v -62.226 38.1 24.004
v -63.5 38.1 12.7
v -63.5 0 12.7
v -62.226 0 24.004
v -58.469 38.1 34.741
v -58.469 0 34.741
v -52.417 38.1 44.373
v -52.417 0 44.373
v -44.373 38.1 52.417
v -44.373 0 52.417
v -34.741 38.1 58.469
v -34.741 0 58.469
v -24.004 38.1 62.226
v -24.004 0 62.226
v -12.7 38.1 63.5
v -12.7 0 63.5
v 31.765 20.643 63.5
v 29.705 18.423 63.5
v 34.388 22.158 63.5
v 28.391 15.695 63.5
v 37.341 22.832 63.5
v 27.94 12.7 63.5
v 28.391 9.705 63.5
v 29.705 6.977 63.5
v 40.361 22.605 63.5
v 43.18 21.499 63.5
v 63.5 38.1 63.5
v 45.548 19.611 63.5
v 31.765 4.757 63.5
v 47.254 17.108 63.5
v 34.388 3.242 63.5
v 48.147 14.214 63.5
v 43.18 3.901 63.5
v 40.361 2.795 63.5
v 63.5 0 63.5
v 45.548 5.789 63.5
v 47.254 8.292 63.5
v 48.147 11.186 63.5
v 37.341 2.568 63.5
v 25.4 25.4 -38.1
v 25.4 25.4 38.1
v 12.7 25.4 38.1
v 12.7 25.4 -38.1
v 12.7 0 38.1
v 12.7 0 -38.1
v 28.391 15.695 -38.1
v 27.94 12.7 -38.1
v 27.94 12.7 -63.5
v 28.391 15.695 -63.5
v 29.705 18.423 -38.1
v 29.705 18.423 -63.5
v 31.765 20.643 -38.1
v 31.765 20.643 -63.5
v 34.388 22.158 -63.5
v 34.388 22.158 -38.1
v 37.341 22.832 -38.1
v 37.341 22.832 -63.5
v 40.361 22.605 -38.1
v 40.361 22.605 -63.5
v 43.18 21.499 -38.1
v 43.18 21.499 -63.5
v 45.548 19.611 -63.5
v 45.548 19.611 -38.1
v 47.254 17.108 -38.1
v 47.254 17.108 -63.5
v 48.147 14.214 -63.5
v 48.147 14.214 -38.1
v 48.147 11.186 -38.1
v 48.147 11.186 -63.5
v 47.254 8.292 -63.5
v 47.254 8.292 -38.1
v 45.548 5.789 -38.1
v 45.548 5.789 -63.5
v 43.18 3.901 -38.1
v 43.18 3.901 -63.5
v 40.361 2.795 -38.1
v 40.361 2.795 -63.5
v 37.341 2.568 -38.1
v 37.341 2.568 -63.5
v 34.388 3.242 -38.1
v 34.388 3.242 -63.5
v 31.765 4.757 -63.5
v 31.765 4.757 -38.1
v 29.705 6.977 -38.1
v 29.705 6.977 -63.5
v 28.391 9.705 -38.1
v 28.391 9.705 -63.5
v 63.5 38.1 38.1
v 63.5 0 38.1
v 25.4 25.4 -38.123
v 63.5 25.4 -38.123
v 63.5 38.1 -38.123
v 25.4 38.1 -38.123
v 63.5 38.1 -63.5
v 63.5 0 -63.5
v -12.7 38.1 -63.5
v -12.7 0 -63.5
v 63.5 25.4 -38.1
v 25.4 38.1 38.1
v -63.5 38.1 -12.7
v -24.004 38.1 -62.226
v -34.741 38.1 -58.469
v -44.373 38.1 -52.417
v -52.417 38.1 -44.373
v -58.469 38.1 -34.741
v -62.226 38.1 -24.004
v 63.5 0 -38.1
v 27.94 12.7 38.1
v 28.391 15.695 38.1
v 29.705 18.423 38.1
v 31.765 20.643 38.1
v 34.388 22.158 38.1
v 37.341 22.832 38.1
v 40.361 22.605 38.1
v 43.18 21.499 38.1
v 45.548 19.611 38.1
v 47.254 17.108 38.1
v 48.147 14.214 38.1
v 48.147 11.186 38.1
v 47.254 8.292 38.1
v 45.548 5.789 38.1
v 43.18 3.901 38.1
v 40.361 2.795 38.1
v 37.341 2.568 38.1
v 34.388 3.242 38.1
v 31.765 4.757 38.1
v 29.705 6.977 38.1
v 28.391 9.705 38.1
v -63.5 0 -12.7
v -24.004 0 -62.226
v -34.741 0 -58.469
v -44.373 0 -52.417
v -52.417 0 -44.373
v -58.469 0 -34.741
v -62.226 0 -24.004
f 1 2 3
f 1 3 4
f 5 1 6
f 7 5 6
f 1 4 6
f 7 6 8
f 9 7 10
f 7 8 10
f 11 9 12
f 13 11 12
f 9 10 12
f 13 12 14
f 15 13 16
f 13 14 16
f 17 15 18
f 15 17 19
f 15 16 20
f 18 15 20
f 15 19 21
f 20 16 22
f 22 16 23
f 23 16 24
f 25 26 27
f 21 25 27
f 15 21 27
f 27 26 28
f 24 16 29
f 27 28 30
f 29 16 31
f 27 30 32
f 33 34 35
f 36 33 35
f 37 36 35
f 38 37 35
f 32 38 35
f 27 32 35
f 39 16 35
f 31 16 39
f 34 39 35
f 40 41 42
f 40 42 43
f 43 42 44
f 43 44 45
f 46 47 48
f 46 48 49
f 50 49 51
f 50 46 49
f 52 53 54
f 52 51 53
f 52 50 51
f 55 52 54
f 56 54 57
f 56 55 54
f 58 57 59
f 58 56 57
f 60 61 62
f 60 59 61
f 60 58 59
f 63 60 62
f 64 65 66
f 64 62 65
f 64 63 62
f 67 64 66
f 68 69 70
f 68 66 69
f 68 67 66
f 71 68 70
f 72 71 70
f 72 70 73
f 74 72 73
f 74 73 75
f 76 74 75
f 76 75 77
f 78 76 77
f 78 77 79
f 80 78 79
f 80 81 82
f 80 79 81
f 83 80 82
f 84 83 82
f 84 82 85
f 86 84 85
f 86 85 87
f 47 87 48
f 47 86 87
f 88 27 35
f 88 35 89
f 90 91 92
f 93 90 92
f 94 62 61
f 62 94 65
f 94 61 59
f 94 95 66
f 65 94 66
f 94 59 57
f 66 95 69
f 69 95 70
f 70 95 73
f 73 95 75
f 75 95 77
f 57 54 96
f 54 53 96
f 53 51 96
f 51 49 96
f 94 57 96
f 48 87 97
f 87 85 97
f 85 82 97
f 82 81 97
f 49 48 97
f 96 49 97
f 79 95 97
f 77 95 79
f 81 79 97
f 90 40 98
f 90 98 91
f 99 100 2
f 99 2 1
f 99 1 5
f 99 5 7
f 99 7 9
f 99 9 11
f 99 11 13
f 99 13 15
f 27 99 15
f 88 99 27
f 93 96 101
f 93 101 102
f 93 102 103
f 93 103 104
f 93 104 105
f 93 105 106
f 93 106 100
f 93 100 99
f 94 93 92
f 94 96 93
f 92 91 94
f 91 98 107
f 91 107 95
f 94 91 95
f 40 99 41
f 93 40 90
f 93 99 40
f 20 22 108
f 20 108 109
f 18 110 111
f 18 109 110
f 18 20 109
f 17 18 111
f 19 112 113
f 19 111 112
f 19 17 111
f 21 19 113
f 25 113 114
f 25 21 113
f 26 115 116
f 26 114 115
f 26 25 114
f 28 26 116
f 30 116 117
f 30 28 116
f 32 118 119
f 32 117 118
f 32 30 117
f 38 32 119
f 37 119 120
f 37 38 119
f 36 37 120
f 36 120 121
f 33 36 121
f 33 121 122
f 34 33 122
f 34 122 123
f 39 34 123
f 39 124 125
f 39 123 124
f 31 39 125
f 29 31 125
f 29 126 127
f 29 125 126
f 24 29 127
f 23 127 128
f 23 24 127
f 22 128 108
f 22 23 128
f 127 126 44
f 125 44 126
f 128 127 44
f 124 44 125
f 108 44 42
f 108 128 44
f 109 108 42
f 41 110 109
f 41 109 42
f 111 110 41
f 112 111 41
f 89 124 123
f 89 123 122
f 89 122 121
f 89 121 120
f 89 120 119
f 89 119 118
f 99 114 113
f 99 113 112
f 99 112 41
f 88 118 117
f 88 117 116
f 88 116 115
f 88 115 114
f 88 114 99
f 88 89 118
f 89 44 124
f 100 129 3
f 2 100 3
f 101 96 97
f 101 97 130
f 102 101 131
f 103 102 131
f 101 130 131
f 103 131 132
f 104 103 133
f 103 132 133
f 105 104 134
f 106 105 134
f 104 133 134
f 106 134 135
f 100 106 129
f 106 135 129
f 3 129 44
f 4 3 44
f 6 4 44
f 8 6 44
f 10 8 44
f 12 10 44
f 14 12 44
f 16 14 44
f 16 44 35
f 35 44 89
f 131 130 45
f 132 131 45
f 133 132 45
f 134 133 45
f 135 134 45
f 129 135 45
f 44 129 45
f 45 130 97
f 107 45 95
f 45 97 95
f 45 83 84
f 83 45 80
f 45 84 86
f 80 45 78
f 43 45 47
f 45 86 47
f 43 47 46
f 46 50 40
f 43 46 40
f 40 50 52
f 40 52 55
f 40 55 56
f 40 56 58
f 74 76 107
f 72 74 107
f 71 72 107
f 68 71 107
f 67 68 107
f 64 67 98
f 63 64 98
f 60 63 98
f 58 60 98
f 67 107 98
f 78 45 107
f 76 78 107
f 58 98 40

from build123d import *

# Parameters (mm, degrees)
BOSS_EXTRUDE1_DEPTH     = 38.1
SKETCH2_W               = 76.2
SKETCH2_H               = 50.8
CUT_EXTRUDE1_DEPTH      = 50.8
CUT_EXTRUDE2_DEPTH      = 126.723585695
CUT_EXTRUDE2_DEPTH_BACK = 126.723585695
SKETCH3_R               = 10.16
SKETCH6_W               = 76.223232364
SKETCH6_H               = 12.7
CUT_EXTRUDE4_DEPTH      = 38.1


with BuildPart() as part:
    # Sketch1 → Boss-Extrude1 (new body)
    with BuildSketch(Plane(origin=(0, 0, 0), x_dir=(1, 0, 0), z_dir=(0, 1, 0))):
        with BuildLine():
            Line((63.5, 63.5), (-12.7, 63.5))
            ThreePointArc((-12.7, 63.5), (-48.621024484, 48.621024484), (-63.5, 12.7))
            Line((-63.5, 12.7), (-63.5, -12.7))
            ThreePointArc((-63.5, -12.7), (-48.621024484, -48.621024484), (-12.7, -63.5))
            Line((-12.7, -63.5), (63.5, -63.5))
            Line((63.5, -63.5), (63.5, 63.5))
        make_face()
    extrude(amount=BOSS_EXTRUDE1_DEPTH)

    # Sketch2 → Cut-Extrude1 (cut)
    with BuildSketch(Plane(origin=(63.5, 0, 0), x_dir=(0, 0, -1), z_dir=(1, 0, 0))):
        Rectangle(SKETCH2_W, SKETCH2_H)
    extrude(amount=-CUT_EXTRUDE1_DEPTH, mode=Mode.SUBTRACT)

    # Sketch3 → Cut-Extrude2 (cut, two sides: drawn at the far end of the back side and taken through both)
    with BuildSketch(Plane(origin=(0, 0, 38.1), x_dir=(-1, 0, 0), z_dir=(0, 0, -1)).offset(-CUT_EXTRUDE2_DEPTH_BACK)):
        with Locations((-38.1, 12.7)):
            Circle(SKETCH3_R)
    extrude(amount=CUT_EXTRUDE2_DEPTH + CUT_EXTRUDE2_DEPTH_BACK, mode=Mode.SUBTRACT)

    # Sketch6 → Cut-Extrude4 (cut)
    with BuildSketch(Plane(origin=(63.5, 0, 0), x_dir=(0, 0, -1), z_dir=(1, 0, 0))):
        with Locations((0.011616182, 31.75)):
            Rectangle(SKETCH6_W, SKETCH6_H)
    extrude(amount=-CUT_EXTRUDE4_DEPTH, mode=Mode.SUBTRACT)


solid = part.part
